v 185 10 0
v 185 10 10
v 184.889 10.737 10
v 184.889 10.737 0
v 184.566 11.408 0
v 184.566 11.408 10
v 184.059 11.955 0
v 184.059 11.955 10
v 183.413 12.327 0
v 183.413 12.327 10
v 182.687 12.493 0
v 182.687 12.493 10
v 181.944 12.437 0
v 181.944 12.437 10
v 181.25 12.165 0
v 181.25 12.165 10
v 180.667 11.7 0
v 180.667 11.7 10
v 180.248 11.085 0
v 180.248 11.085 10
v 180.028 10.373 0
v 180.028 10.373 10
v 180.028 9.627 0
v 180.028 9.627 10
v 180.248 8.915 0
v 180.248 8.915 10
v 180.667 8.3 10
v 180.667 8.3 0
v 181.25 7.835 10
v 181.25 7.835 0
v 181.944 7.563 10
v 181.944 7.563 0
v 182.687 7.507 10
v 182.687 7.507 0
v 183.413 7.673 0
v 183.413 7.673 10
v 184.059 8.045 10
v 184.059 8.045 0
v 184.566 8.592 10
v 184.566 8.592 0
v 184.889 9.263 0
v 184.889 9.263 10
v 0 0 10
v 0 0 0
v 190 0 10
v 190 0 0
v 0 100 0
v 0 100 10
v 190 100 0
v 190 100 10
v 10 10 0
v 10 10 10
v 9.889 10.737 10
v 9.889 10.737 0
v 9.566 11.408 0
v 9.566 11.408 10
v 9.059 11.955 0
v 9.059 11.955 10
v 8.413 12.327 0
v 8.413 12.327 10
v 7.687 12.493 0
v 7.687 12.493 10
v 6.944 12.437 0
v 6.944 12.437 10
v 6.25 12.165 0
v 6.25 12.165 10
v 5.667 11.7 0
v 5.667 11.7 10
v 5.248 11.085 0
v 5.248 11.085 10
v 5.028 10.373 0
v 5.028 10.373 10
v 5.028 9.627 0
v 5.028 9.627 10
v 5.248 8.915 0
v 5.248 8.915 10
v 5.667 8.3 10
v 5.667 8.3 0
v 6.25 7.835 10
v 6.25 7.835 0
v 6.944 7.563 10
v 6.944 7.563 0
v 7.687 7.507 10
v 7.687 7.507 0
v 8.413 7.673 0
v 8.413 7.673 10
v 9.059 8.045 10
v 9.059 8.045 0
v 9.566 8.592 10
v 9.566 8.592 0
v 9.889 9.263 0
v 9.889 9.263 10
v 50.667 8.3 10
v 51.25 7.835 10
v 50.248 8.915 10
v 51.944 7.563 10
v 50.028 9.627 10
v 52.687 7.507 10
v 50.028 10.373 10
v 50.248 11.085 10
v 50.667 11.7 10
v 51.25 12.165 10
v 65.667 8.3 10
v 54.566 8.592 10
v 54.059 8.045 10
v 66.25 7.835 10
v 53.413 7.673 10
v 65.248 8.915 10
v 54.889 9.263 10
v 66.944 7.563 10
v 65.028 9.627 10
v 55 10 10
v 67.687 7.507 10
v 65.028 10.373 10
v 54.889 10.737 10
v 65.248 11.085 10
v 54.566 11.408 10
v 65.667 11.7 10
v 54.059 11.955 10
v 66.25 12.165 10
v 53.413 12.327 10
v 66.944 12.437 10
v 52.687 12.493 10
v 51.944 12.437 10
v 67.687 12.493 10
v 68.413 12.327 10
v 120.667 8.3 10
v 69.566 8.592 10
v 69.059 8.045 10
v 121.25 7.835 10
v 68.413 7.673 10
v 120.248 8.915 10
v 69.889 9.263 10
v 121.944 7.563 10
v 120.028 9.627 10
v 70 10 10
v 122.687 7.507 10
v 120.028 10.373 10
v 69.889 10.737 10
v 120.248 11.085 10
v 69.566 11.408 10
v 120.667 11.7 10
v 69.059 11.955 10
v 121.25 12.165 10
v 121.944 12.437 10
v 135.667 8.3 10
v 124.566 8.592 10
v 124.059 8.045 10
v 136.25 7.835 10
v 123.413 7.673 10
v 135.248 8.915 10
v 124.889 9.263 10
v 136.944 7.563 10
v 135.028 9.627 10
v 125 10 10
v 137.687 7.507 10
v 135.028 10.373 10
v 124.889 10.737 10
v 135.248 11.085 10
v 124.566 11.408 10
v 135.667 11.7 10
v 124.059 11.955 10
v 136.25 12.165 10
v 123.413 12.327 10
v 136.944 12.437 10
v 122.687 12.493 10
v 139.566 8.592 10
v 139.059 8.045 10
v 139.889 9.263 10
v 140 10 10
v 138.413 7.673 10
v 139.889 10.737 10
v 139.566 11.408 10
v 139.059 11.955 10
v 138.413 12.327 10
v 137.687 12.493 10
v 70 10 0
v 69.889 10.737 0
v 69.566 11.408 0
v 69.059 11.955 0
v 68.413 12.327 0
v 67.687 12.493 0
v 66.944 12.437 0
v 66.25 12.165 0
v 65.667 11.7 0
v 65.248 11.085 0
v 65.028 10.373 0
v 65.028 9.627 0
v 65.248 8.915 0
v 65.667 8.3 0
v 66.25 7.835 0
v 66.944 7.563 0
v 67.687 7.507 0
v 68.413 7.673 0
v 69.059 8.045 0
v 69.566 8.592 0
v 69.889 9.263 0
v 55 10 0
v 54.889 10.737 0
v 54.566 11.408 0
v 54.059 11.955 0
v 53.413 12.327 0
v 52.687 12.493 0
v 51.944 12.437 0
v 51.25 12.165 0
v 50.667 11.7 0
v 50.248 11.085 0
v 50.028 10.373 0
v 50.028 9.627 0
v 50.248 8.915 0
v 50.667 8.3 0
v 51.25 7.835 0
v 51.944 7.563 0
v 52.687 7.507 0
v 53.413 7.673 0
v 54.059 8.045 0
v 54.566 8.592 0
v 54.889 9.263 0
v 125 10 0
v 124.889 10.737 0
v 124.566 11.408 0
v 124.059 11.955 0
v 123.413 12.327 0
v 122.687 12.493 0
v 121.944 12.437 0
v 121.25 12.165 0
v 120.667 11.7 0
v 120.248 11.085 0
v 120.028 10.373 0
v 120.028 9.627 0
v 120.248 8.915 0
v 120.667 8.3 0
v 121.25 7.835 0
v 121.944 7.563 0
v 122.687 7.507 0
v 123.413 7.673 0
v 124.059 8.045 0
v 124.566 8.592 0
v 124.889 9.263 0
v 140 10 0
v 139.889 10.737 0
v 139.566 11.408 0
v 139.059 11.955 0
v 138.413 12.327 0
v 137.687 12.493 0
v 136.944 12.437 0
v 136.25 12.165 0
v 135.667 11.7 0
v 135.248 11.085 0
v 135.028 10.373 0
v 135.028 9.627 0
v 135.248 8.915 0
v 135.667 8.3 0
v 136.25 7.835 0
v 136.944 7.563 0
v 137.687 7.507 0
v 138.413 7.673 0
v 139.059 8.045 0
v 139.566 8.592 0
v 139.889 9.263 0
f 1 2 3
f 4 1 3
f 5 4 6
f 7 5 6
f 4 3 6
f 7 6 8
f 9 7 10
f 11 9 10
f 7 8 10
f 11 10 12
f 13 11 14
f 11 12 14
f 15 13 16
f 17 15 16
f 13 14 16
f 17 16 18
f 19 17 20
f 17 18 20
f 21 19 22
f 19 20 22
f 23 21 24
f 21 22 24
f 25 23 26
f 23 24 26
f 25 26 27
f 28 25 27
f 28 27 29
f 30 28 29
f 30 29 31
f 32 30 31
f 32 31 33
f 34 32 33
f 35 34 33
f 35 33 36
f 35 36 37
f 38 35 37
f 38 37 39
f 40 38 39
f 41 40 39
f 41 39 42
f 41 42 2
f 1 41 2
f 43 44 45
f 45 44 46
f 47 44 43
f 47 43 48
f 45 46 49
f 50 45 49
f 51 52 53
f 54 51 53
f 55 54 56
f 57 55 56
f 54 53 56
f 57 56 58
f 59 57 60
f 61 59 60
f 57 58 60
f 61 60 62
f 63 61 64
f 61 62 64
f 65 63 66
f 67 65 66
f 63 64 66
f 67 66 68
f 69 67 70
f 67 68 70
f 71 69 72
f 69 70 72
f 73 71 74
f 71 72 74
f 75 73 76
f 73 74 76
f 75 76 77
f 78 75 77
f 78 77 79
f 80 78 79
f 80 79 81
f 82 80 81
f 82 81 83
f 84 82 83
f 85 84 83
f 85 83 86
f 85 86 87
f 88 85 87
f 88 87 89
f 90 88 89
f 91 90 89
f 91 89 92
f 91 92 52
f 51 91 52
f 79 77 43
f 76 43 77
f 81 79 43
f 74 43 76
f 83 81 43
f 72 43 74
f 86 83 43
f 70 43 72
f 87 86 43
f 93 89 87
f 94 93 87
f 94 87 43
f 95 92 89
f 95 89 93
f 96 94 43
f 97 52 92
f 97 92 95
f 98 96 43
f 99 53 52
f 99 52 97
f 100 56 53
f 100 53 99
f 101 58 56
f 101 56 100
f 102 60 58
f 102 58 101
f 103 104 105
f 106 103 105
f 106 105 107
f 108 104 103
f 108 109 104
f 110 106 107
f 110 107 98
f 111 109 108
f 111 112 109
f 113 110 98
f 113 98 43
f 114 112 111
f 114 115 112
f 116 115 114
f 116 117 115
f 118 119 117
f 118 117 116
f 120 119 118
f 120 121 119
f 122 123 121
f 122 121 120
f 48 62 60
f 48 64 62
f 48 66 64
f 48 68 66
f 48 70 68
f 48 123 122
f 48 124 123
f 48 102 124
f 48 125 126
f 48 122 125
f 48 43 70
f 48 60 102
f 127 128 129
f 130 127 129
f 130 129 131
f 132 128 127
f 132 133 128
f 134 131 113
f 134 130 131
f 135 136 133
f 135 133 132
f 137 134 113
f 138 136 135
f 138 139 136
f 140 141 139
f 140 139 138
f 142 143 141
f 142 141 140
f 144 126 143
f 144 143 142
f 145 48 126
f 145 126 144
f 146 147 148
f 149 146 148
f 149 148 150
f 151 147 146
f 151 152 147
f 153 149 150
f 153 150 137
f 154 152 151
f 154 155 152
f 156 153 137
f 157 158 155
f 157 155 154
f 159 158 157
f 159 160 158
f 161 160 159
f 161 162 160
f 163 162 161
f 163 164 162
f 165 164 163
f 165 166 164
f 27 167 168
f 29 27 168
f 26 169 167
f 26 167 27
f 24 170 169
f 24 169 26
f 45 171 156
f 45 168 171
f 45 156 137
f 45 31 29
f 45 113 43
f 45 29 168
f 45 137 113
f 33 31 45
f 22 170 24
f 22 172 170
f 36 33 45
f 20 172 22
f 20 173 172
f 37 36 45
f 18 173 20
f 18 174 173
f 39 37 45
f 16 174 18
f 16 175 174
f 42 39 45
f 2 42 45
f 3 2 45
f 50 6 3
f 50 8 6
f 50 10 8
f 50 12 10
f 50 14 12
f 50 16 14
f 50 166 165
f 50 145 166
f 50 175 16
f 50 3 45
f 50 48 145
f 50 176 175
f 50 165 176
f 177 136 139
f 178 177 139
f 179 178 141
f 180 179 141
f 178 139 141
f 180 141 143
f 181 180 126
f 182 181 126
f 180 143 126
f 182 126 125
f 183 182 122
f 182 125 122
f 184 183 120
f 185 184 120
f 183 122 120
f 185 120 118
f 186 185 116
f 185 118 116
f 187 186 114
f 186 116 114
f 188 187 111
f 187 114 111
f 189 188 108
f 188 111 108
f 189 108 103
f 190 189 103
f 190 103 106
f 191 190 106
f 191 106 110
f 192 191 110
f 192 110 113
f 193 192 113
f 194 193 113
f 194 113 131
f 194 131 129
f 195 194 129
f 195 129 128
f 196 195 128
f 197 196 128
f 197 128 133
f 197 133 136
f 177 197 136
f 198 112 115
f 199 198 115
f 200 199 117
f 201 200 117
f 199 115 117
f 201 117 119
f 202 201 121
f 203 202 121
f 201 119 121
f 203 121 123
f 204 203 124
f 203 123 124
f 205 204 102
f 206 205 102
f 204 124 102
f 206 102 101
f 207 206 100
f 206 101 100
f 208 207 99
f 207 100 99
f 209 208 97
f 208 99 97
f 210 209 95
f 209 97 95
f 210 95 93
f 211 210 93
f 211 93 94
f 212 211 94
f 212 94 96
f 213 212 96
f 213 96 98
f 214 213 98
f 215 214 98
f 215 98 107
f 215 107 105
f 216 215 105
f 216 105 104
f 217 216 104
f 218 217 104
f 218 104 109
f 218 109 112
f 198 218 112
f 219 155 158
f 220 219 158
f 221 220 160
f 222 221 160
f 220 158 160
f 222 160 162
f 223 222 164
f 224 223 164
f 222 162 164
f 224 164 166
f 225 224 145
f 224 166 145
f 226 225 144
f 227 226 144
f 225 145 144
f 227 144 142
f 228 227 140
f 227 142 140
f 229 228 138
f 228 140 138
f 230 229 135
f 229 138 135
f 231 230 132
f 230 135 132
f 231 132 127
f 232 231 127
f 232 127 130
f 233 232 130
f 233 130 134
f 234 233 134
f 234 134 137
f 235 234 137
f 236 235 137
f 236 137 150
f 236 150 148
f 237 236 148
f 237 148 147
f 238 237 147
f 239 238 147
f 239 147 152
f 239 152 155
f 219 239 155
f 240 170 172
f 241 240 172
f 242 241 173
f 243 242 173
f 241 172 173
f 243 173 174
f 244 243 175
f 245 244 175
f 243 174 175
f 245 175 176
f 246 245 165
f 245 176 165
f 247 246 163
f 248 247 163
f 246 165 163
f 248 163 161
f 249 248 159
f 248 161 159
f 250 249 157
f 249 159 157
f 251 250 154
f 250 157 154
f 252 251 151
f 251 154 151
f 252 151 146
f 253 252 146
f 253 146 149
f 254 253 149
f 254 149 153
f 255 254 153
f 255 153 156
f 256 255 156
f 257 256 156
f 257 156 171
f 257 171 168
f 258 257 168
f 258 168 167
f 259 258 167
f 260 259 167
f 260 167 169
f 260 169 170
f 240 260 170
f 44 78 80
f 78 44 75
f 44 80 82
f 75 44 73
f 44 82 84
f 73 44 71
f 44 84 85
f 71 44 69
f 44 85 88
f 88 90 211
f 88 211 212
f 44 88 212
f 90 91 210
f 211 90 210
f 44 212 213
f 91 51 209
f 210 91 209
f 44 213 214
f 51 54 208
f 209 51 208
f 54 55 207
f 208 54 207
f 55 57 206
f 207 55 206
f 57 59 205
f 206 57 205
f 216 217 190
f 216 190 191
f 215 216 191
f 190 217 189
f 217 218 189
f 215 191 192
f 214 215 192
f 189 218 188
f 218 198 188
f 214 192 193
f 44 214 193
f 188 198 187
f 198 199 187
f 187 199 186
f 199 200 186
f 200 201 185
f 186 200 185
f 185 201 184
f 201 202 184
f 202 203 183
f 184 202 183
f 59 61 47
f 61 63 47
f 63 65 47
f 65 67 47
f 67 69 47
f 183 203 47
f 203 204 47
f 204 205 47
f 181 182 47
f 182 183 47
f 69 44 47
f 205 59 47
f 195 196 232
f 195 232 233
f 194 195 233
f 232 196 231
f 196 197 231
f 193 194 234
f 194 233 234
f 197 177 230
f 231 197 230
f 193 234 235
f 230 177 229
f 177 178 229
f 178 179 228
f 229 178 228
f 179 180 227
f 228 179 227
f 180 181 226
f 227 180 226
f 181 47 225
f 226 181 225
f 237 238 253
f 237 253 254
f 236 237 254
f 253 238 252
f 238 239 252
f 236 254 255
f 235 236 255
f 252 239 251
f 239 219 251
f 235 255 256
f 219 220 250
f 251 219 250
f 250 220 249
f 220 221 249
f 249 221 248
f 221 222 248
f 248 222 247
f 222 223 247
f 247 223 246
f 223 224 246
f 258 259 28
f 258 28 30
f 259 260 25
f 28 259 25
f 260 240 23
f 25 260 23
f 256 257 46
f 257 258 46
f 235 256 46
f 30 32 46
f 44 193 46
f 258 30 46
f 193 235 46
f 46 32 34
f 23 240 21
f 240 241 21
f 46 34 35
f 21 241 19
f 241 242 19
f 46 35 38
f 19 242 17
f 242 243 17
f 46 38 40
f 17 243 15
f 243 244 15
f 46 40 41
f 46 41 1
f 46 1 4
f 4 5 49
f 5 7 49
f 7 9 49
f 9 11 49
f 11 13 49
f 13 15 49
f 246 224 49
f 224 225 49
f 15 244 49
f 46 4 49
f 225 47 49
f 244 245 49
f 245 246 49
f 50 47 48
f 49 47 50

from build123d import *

# Parameters (mm, degrees)
SKETCH_W               = 190
SKETCH_H               = 100
PAD_DEPTH              = 10
SKETCH001_R            = 2.5
HOLE_DEPTH             = 10.001
SKETCH002_R            = 2.5
HOLE001_DEPTH          = 10.001
LINEARPATTERN_COUNT    = 2
LINEARPATTERN_PITCH    = 15
LINEARPATTERN001_COUNT = 2
LINEARPATTERN001_PITCH = 70
LINEARPATTERN002_COUNT = 2
LINEARPATTERN002_PITCH = 85
LINEARPATTERN003_COUNT = 2
LINEARPATTERN003_PITCH = 130


with BuildPart() as part:
    # Sketch → Pad (new body)
    with BuildSketch(Plane.XY):
        with Locations((95, 50)):
            Rectangle(SKETCH_W, SKETCH_H)
    extrude(amount=PAD_DEPTH)

    # Sketch001 (on Face6 of Pad) → Hole (cut, through all)
    with BuildSketch(Plane.XY.offset(10)):
        with Locations((7.5, 10)):
            Circle(SKETCH001_R)
    extrude(amount=-HOLE_DEPTH, mode=Mode.SUBTRACT)

    # Sketch002 (on Face5 of Hole) → Hole001 (cut, through all)
    with BuildSketch(Plane.XY.offset(10)):
        with Locations((52.5, 10)):
            Circle(SKETCH002_R)
    hole001 = extrude(amount=-HOLE001_DEPTH, mode=Mode.SUBTRACT)

    # LinearPattern: Hole001 ×2
    with Locations(*[(i * LINEARPATTERN_PITCH, 0, 0) for i in range(1, LINEARPATTERN_COUNT)]):
        add(hole001, mode=Mode.SUBTRACT)

    # LinearPattern001: Hole001 ×2
    with Locations(*[(i * LINEARPATTERN001_PITCH, 0, 0) for i in range(1, LINEARPATTERN001_COUNT)]):
        add(hole001, mode=Mode.SUBTRACT)

    # LinearPattern002: Hole001 ×2
    with Locations(*[(i * LINEARPATTERN002_PITCH, 0, 0) for i in range(1, LINEARPATTERN002_COUNT)]):
        add(hole001, mode=Mode.SUBTRACT)

    # LinearPattern003: Hole001 ×2
    with Locations(*[(i * LINEARPATTERN003_PITCH, 0, 0) for i in range(1, LINEARPATTERN003_COUNT)]):
        add(hole001, mode=Mode.SUBTRACT)


solid = part.part
